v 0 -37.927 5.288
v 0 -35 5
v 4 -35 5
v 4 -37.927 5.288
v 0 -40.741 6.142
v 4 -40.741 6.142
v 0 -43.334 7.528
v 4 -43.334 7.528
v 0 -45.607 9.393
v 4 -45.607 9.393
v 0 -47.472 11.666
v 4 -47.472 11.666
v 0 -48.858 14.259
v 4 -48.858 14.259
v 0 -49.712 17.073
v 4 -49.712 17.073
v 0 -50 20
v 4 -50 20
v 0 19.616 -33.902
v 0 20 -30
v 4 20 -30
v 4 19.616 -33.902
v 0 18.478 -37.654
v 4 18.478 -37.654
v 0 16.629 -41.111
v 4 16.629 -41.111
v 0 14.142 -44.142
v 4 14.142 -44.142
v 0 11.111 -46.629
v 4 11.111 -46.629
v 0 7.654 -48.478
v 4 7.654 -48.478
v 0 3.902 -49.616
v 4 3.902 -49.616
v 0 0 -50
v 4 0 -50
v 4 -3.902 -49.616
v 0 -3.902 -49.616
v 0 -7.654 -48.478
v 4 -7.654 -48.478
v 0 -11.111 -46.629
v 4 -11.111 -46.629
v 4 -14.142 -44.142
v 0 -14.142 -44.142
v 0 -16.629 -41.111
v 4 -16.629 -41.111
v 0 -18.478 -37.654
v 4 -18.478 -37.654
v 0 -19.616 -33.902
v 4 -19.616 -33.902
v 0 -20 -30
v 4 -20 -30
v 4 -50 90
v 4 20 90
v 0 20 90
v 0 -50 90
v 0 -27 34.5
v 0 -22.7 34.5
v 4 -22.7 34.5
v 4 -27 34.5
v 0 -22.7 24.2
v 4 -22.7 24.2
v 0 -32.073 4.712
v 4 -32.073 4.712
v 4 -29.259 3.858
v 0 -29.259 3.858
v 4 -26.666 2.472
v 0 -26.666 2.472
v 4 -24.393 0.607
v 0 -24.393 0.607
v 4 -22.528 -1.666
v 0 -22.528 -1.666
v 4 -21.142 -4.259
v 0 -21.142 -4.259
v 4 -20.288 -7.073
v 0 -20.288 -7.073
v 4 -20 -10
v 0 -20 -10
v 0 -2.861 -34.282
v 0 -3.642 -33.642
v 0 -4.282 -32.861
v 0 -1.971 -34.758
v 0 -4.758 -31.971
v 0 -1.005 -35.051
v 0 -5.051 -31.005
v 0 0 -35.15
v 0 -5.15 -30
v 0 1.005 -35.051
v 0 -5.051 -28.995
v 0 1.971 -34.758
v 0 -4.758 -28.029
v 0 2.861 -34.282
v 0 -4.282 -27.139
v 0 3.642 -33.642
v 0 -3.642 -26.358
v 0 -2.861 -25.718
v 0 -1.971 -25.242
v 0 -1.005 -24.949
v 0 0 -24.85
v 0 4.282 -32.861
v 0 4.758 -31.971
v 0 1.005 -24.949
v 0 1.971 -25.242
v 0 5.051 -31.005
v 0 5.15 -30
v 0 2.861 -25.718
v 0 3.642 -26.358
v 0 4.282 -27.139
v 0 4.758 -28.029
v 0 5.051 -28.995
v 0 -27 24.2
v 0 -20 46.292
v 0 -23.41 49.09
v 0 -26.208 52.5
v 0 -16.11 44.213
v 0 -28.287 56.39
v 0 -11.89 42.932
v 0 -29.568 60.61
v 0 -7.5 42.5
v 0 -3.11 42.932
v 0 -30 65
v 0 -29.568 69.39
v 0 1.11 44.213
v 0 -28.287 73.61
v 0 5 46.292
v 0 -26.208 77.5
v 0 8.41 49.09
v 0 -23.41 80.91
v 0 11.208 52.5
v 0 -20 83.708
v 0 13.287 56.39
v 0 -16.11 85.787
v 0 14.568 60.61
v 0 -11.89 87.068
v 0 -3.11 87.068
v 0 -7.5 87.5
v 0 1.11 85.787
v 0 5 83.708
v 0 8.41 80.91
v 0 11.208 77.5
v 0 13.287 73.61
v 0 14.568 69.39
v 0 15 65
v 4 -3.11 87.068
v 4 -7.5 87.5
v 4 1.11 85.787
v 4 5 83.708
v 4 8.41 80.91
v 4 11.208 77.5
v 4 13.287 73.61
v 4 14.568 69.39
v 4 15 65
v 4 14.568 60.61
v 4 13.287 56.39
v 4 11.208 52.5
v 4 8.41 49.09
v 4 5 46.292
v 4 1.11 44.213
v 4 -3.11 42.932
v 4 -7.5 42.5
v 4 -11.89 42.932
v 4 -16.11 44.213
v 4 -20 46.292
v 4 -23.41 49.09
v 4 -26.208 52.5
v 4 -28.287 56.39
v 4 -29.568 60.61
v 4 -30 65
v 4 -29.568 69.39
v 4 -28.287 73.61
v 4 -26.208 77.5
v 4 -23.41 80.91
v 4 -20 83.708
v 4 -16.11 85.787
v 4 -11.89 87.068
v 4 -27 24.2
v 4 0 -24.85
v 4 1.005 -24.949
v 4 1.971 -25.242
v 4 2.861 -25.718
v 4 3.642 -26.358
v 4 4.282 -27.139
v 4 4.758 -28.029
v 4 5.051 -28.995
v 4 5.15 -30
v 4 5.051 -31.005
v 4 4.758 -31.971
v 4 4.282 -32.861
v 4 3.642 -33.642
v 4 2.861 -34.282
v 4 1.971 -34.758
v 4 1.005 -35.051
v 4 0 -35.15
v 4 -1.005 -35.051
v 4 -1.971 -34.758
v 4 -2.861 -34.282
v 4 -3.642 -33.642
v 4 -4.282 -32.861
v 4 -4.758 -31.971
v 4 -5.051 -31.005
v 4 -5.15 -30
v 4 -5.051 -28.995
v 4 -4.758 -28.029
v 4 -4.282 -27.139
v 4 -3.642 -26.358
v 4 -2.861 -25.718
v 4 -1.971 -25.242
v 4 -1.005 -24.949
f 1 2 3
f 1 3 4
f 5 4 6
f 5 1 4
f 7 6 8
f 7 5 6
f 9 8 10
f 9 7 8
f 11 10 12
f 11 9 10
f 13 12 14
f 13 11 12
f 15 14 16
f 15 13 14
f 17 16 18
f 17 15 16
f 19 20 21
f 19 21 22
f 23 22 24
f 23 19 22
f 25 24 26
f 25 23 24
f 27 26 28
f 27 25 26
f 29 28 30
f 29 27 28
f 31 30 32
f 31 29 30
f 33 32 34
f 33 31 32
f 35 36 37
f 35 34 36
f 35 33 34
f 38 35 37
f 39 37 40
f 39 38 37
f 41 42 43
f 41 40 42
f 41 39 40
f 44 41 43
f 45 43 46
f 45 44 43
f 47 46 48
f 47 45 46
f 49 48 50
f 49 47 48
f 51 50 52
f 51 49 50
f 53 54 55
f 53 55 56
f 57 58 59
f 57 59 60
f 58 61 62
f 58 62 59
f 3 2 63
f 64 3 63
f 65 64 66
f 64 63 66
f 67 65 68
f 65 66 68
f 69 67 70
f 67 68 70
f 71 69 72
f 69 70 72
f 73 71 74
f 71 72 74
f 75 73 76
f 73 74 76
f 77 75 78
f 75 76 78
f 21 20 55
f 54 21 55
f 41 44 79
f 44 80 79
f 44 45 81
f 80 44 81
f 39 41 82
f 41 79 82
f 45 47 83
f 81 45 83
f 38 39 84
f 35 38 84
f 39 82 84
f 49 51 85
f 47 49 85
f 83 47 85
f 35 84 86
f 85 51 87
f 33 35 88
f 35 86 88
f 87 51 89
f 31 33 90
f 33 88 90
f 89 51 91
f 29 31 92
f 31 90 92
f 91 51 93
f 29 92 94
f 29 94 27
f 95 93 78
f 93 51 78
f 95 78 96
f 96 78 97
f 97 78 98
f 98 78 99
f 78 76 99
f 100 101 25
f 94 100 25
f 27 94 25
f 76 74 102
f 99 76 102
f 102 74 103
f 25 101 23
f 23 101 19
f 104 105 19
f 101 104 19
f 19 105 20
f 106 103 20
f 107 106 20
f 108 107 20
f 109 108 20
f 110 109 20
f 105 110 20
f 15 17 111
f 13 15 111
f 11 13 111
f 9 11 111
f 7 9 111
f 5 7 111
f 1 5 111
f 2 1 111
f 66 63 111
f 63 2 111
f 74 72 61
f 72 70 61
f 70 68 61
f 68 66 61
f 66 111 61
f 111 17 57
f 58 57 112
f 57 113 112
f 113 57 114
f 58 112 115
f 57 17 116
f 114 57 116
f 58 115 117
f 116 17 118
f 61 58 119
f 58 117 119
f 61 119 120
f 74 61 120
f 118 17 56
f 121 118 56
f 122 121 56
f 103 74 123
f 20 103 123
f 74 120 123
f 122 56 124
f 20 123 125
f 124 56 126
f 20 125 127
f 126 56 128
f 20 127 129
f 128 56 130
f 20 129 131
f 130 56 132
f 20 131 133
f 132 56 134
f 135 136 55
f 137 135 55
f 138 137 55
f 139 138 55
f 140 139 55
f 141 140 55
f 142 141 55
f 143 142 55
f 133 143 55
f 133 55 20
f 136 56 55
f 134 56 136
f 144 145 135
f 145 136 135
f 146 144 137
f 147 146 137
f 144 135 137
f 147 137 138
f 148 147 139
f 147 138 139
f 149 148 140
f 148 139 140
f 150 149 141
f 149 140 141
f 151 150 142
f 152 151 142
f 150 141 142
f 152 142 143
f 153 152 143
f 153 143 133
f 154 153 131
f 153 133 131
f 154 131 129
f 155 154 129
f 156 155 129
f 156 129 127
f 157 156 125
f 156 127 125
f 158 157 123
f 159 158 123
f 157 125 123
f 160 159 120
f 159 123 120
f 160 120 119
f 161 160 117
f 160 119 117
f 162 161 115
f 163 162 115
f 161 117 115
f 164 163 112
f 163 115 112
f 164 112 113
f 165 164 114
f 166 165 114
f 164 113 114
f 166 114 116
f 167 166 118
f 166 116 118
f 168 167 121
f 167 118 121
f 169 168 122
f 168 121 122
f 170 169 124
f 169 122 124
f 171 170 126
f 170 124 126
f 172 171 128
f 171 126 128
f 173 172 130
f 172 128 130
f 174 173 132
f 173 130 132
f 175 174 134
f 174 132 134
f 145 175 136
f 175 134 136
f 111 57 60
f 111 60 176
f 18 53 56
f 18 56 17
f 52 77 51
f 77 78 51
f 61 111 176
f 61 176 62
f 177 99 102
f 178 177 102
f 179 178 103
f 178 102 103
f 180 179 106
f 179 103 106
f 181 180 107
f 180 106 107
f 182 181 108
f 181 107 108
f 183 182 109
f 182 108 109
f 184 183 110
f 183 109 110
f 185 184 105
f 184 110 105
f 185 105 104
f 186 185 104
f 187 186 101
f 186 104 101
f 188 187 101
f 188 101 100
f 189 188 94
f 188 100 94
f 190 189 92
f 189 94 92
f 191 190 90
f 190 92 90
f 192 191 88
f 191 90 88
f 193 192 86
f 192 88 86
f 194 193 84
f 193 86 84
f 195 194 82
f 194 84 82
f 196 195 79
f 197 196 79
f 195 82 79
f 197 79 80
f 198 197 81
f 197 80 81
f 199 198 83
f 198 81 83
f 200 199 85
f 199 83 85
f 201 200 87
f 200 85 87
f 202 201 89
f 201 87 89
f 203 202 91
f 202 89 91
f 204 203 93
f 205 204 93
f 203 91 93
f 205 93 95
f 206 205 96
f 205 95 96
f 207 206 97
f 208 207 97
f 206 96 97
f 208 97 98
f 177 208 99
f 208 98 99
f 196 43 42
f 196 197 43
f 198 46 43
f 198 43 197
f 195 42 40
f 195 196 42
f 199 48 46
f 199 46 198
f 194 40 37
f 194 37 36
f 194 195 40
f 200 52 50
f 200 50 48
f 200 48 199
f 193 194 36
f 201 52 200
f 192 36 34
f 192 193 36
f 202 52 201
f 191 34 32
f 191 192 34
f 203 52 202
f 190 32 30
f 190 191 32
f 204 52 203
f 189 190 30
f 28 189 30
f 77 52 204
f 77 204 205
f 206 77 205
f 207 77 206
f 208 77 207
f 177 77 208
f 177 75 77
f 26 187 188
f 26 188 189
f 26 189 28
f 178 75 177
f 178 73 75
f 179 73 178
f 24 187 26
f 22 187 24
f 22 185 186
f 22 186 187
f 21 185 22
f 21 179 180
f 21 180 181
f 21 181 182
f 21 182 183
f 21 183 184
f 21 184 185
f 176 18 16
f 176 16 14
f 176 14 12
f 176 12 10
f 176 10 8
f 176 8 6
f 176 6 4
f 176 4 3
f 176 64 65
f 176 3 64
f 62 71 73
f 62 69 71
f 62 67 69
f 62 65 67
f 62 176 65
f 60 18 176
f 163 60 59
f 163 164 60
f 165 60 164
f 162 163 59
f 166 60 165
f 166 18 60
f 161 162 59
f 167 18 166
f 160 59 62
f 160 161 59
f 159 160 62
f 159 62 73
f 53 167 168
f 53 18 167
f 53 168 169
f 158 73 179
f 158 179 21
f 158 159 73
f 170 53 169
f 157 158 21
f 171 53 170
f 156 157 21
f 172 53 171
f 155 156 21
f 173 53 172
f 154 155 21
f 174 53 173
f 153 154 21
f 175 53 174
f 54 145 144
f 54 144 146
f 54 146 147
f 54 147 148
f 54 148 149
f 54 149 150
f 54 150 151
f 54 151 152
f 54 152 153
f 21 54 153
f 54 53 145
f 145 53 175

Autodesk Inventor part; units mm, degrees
ref_plane "YZ Plane" through (0, 0, 0) normal (1, 0, 0) x (0, 1, 0)
ref_plane "XZ Plane" through (0, 0, 0) normal (0, 1, 0) x (-1, 0, 0)
ref_plane "XY Plane" through (0, 0, 0) normal (0, 0, 1) x (1, 0, 0)
sketch "Sketch1" plane through (0, 0, 0) normal (1, 0, 0) x (0, 1, 0)
  line L0 (-20, -30) -> (20, -30)
  line L1 (20, -30) -> (20, 30)
  line L2 (20, 30) -> (-20, 30)
  line L3 (-20, 30) -> (-20, -30)
  line L4 (-20, -30) -> (20, 30) construction
  line L5 (20, -30) -> (-20, 30) construction
  circle A0 centre (0, -30) radius 20
  point P0 (0, 0)
  dimension "d0" = 40
  dimension "d1" = 60
extrude "Extrusion1" add sketch "Sketch1" along normal blind 4
sketch "Sketch4" plane through (4, 0, 0) normal (1, 0, 0) x (0, 0, -1)
  line L0 (-5, 20) -> (-90, 20)
  line L1 (-90, 20) -> (-90, -50)
  line L2 (-90, -50) -> (-5, -50)
  line L3 (-5, -50) -> (-5, 20)
  line L4 (0, -64) -> (0, 34) projected
  line L5 (-10, -77.5279) -> (-10, 43.8166)
  dimension "d40" = 85
  dimension "d41" = 70
  dimension "d54" = 10
  dimension "d55" = 5
extrude "Extrusion4" add sketch "Sketch4" against normal blind 4
sketch "Sketch5" plane through (0, 0, 0) normal (-1, 0, 0) x (0, 0, 1)
  line L0 (34.5, -27) -> (24.2, -27)
  line L1 (24.2, -27) -> (24.2, -22.7)
  line L2 (24.2, -22.7) -> (34.5, -22.7)
  line L3 (34.5, -22.7) -> (34.5, -27)
  line L4 (90, -50) -> (90, -6.689)
  line L5 (90, -50) -> (90, 20) projected
  line L6 (90, -50) -> (10.2215, -50)
  line L7 (5, -50) -> (90, -50) projected
  dimension "d20" = 10.3
  dimension "d21" = 4.3
extrude "Extrusion5" cut sketch "Sketch5" against normal blind 4
sketch "Sketch2" plane through (0, 0, 0) normal (-1, 0, 0) x (0, 0, 1)
  arc A0 (-30, 20) -> (-30, -20) centre (-30, 0) ccw projected
  circle A1 centre (-30, 0) radius 5.15
  point P0 (0, 0)
  dimension "d4" = 10.3
extrude "Extrusion2" cut sketch "Sketch2" against normal blind 4
sketch "Sketch7" plane through (0, 0, 0) normal (-1, 0, 0) x (0, 0, 1)
  circle A0 centre (65, -7.5) radius 22.5
  line L0 (90, -50) -> (90, 20) projected
  line L1 (-30, 20) -> (90, 20) projected
  point P0 (0, 0)
  dimension "d47" = 45
  dimension "d48" = 25
  dimension "d53" = 27.5
extrude "Extrusion7" cut sketch "Sketch7" against normal blind 4
fillet "Fillet3" radius 15 2 edges at (2, -20, 5) (2, -50, 5)
properties part number "houder"
